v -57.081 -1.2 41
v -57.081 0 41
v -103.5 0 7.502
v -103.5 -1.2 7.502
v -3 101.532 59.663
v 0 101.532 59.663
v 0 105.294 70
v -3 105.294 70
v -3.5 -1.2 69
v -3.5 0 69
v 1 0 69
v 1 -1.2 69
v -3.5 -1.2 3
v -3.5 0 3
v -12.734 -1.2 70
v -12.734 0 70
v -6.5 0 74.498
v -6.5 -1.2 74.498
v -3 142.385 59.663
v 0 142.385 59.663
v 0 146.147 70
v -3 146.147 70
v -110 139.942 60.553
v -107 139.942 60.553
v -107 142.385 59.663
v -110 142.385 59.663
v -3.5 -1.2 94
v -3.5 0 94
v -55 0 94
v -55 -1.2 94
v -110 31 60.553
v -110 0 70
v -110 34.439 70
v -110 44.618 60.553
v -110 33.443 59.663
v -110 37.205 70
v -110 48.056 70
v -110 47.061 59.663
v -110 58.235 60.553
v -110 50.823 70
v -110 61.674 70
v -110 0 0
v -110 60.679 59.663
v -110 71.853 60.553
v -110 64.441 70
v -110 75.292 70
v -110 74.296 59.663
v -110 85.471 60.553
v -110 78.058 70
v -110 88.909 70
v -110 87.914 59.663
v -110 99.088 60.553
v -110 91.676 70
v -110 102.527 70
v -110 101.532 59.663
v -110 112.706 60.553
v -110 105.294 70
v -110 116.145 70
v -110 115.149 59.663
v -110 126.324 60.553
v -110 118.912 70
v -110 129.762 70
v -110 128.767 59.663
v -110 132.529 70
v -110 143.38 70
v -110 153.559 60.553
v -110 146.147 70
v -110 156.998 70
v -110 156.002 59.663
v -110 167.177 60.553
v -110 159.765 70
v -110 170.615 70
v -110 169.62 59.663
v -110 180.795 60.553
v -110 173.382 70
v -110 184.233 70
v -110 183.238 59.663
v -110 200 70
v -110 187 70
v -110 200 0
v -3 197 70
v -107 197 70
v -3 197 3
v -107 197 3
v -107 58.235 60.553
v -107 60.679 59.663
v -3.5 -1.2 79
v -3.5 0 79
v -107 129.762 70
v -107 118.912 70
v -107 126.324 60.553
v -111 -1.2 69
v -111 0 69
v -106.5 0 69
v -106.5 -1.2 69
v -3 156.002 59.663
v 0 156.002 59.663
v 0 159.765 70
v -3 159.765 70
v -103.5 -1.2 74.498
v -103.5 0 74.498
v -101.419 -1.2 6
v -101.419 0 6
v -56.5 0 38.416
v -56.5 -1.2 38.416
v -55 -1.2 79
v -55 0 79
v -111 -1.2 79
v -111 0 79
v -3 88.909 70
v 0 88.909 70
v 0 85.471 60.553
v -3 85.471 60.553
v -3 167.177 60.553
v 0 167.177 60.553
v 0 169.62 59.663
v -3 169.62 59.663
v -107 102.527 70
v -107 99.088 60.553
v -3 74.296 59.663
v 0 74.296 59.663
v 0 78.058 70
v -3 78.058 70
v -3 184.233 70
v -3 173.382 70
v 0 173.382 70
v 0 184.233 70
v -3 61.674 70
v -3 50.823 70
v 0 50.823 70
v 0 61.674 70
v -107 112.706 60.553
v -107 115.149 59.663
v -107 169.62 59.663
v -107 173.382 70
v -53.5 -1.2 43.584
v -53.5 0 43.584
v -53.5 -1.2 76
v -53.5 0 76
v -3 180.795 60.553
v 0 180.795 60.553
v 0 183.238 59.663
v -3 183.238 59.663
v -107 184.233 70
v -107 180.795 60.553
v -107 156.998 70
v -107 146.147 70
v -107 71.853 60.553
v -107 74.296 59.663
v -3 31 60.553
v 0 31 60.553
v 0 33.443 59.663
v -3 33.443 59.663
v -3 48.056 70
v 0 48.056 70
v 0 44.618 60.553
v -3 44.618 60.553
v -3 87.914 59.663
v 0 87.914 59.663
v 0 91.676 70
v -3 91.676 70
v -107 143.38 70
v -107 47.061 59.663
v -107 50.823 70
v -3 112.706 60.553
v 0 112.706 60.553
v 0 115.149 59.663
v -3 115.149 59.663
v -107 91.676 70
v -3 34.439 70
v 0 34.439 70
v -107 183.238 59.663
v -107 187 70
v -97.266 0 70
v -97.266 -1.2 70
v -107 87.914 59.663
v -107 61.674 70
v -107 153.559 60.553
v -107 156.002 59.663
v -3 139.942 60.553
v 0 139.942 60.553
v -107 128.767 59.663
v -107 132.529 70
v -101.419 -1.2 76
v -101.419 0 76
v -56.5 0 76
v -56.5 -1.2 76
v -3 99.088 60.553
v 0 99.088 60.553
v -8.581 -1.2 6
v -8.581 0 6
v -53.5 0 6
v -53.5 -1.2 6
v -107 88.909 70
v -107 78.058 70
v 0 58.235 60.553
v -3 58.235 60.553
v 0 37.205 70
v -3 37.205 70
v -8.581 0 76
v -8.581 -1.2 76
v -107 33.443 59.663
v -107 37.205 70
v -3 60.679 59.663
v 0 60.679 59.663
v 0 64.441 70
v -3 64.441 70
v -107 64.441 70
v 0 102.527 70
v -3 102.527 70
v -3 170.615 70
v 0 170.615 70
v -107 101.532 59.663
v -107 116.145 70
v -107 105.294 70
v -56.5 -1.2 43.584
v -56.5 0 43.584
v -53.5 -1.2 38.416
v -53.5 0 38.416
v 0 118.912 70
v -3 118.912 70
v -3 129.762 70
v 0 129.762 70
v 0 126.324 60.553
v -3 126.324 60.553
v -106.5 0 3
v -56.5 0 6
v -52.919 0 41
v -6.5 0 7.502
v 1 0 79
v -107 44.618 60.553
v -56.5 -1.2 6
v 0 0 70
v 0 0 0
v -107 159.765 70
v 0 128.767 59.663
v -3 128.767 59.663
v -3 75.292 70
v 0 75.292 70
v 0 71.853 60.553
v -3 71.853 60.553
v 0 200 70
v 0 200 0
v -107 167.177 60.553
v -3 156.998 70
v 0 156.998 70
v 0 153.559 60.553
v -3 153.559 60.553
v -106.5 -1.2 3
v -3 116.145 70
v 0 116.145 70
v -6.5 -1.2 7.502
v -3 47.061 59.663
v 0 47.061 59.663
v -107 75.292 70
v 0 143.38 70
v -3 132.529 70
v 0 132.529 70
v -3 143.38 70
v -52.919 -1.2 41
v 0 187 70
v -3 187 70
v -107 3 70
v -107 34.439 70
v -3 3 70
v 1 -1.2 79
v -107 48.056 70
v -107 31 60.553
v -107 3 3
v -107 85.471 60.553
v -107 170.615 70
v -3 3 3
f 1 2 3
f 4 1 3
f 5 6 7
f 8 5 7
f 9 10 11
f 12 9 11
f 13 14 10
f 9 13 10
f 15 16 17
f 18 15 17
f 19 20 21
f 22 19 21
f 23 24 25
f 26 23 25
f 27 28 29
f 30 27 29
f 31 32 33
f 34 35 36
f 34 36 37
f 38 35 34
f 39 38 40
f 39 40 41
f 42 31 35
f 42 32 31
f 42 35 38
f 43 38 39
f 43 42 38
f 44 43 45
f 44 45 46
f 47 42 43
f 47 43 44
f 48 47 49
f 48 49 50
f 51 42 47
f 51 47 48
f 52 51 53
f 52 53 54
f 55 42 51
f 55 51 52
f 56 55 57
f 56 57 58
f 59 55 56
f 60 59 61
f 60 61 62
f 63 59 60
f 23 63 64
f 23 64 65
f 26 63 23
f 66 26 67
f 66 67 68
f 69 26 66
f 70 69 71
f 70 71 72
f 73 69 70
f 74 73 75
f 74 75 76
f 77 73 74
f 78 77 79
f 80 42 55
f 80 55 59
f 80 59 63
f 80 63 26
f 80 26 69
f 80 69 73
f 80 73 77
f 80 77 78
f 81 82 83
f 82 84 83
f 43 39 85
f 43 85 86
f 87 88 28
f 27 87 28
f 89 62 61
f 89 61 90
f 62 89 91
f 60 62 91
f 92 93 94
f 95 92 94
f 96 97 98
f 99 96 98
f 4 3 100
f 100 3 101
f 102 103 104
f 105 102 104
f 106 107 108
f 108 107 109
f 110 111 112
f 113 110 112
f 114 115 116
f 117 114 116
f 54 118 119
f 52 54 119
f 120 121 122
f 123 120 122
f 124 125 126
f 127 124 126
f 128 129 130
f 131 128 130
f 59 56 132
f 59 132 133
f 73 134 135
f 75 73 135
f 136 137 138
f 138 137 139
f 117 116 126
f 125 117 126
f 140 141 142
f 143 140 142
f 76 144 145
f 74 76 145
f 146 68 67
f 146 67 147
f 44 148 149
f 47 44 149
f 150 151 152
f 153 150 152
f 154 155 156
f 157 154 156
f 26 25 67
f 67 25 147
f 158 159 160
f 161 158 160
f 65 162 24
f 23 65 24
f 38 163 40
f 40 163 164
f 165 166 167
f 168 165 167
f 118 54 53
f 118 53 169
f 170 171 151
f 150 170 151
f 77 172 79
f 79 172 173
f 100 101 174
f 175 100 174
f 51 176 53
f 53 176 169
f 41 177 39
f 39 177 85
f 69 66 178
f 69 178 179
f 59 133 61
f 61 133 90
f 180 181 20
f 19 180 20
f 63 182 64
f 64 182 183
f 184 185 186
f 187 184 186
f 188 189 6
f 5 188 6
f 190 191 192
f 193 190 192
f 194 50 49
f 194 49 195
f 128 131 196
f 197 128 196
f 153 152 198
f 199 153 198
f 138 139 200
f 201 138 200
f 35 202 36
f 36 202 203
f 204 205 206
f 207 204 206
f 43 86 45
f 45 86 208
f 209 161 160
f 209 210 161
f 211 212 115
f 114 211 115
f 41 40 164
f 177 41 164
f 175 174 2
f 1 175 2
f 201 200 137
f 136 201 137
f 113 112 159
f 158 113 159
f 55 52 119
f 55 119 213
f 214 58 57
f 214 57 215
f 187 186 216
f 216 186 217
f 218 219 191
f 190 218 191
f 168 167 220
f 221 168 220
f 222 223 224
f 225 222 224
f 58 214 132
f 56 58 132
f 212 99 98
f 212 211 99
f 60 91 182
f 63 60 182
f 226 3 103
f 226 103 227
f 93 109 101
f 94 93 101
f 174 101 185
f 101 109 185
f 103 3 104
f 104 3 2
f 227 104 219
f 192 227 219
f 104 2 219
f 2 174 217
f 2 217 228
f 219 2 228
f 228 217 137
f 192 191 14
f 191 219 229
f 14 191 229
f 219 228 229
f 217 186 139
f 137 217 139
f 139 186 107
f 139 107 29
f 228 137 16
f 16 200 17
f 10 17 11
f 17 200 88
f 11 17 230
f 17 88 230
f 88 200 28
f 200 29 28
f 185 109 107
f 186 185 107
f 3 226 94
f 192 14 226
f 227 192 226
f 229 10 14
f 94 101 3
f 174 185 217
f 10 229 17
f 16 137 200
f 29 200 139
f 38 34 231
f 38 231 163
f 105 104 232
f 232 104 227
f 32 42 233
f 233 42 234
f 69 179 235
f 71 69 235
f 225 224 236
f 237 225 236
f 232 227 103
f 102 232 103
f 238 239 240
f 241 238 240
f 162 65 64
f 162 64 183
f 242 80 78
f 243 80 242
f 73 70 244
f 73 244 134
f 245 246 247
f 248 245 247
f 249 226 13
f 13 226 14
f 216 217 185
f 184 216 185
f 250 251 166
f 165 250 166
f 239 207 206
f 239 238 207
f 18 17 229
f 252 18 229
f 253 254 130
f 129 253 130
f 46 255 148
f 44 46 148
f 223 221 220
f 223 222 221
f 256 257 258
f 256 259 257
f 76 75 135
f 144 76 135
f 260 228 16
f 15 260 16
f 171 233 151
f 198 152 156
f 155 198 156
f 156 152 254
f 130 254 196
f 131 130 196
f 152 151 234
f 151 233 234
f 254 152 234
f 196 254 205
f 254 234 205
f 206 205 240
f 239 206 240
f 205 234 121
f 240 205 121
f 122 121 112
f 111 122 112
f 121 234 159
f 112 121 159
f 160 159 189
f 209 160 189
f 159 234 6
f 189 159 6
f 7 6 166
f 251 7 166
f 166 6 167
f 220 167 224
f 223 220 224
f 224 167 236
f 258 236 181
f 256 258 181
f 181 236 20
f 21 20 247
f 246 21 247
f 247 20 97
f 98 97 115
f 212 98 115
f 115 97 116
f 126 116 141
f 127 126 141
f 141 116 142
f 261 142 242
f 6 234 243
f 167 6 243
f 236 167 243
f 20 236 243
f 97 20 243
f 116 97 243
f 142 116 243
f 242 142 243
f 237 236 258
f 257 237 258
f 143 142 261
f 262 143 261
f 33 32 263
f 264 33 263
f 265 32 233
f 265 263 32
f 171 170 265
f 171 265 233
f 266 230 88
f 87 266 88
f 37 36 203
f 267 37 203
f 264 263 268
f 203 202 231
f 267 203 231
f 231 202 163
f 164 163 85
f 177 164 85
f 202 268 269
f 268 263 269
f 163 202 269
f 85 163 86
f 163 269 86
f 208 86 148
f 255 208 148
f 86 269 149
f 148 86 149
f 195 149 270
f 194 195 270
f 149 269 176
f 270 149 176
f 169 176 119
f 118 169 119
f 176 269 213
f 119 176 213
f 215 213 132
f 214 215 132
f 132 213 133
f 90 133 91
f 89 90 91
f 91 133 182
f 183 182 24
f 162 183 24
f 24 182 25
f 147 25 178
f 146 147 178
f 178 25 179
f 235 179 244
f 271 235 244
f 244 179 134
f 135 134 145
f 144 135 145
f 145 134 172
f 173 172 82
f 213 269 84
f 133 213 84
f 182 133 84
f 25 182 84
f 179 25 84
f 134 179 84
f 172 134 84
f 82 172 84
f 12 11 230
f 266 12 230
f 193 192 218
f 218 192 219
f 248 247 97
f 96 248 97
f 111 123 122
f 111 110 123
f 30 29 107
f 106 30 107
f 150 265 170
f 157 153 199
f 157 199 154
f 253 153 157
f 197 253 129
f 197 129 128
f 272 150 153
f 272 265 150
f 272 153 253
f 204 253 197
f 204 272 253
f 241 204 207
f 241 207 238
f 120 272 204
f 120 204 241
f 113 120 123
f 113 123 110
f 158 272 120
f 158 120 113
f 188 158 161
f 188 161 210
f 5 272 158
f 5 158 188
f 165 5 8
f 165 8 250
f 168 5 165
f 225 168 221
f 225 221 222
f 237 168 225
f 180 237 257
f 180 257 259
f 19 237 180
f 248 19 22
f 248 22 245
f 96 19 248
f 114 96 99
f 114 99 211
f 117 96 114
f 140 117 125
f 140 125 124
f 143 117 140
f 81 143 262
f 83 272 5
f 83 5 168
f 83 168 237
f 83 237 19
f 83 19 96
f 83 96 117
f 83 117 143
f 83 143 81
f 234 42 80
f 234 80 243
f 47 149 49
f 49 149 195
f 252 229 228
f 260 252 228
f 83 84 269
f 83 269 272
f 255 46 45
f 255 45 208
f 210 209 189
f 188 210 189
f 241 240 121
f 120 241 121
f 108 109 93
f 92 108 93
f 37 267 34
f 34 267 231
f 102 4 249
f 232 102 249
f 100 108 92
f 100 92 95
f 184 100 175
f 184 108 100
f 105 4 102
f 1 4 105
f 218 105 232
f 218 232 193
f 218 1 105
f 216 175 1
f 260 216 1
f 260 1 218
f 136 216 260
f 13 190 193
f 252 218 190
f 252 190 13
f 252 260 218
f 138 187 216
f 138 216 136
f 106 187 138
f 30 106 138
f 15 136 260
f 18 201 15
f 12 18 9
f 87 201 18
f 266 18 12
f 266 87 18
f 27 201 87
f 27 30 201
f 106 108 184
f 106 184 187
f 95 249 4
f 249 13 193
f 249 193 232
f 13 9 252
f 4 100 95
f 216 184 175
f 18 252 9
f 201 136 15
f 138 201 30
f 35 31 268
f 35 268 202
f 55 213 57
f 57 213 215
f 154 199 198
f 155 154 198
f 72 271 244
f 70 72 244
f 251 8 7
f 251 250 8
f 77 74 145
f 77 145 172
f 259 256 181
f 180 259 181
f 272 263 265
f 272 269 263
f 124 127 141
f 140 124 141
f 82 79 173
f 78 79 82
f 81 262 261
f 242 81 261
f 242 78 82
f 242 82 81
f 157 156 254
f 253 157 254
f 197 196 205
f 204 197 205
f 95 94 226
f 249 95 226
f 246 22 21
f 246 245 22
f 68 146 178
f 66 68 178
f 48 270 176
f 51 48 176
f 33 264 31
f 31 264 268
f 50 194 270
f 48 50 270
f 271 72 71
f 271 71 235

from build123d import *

# Parameters (mm, degrees)
F0_W     = 110
F0_H     = 200
F1_DEPTH = 70
F2_T     = -3
F5_DEPTH = 110.001
F3_W     = 3
F3_H     = 6
F6_DEPTH = 1.2


with BuildPart() as f1:
    # F0 (on Top) → F1 (new body)
    with BuildSketch(Plane.XY):
        with Locations((-55, 100)):
            Rectangle(F0_W, F0_H)
    extrude(amount=F1_DEPTH)

    # F2
    f2_openings = [f1.faces().sort_by_distance(p)[0] for p in [
        (-55, 100, 70),
    ]]
    offset(amount=F2_T, openings=f2_openings)

    # F4 (on face) → F5 (cut, through all)
    with BuildSketch(Plane.YZ):
        Polygon((183.2377784234, 59.6633811714), (187, 70), (184.2331377916, 70), (180.7945776094, 60.552633544), align=None)
        Polygon((170.615448918, 70), (167.1768887358, 60.552633544), (169.6200895498, 59.6633811714), (173.3823111264, 70), align=None)
        Polygon((156.9977600444, 70), (153.5591998622, 60.552633544), (156.0024006762, 59.6633811714), (159.7646222528, 70), align=None)
        Polygon((143.3800711708, 70), (139.9415109886, 60.552633544), (142.3847118027, 59.6633811714), (146.1469333793, 70), align=None)
        Polygon((129.7623822972, 70), (126.323822115, 60.552633544), (128.7670229291, 59.6633811714), (132.5292445057, 70), align=None)
        Polygon((116.1446934237, 70), (112.7061332415, 60.552633544), (115.1493340555, 59.6633811714), (118.9115556321, 70), align=None)
        Polygon((102.5270045501, 70), (99.0884443679, 60.552633544), (101.5316451819, 59.6633811714), (105.2938667585, 70), align=None)
        Polygon((88.9093156765, 70), (85.4707554943, 60.552633544), (87.9139563084, 59.6633811714), (91.676177885, 70), align=None)
        Polygon((75.2916268029, 70), (71.8530666207, 60.552633544), (74.2962674348, 59.6633811714), (78.0584890114, 70), align=None)
        Polygon((61.6739379294, 70), (58.2353777472, 60.552633544), (60.6785785612, 59.6633811714), (64.4408001378, 70), align=None)
        Polygon((48.0562490558, 70), (44.6176888736, 60.552633544), (47.0608896876, 59.6633811714), (50.8231112642, 70), align=None)
        Polygon((34.4385601822, 70), (31, 60.552633544), (33.443200814, 59.6633811714), (37.2054223906, 70), align=None)
    extrude(amount=-F5_DEPTH, mode=Mode.SUBTRACT)


with BuildPart() as f6:
    # F3 (on face) → F6 (new body)
    with BuildSketch(Plane.XZ):
        Polygon((-55, 79), (-106.5, 79), (-111, 79), (-111, 69), (-110, 69), (-110, 70), (-103.5, 70), (-103.5, 74.4984656638), (-103.5, 76), (-101.4193024199, 76), (-56.5, 76), (-53.5, 76), (-8.5806975801, 76), (-6.5, 76), (-6.5, 74.4984656638), (-6.5, 70), (0, 70), (0, 69), (1, 69), (1, 79), (-3.5, 79), (-3.5, 94), (-55, 94), align=None)
        Polygon((-110, 70), (-110, 69), (-106.5, 69), (-106.5, 3), (-3.5, 3), (-3.5, 69), (0, 69), (0, 70), (-6.5, 70), (-6.5, 7.5015343362), (-6.5, 6), (-8.5806975801, 6), (-53.5, 6), (-56.5, 6), (-101.4193024199, 6), (-103.5, 6), (-103.5, 7.5015343362), (-103.5, 70), align=None)
        Polygon((-57.0806975801, 41), (-103.5, 7.5015343362), (-103.5, 6), (-101.4193024199, 6), (-56.5, 38.415991437), (-56.5, 40.5809398906), align=None)
        Polygon((-56.5, 43.584008563), (-56.5, 41.4190601094), (-55, 42.5015343362), align=None)
        Polygon((-52.9193024199, 41), (-12.7335881342, 70), (-16.8949832944, 70), (-53.5, 43.584008563), (-53.5, 41.4190601094), align=None)
        Polygon((-52.9193024199, 41), (-53.5, 41.4190601094), (-53.5, 40.5809398906), align=None)
        Polygon((-6.5, 6), (-6.5, 7.5015343362), (-52.9193024199, 41), (-53.5, 40.5809398906), (-53.5, 38.415991437), (-8.5806975801, 6), align=None)
        Polygon((-12.7335881342, 70), (-6.5, 74.4984656638), (-6.5, 76), (-8.5806975801, 76), (-16.8949832944, 70), align=None)
        Polygon((-103.5, 76), (-103.5, 74.4984656638), (-97.2664118658, 70), (-93.1050167056, 70), (-101.4193024199, 76), align=None)
        Polygon((-93.1050167056, 70), (-97.2664118658, 70), (-57.0806975801, 41), (-56.5, 41.4190601094), (-56.5, 43.584008563), align=None)
        Polygon((-56.5, 70), (-56.5, 43.584008563), (-55, 42.5015343362), (-53.5, 43.584008563), (-53.5, 70), align=None)
        with Locations((-55, 73)):
            Rectangle(F3_W, F3_H)
        Polygon((-56.5, 38.415991437), (-56.5, 6), (-53.5, 6), (-53.5, 38.415991437), (-55, 39.4984656638), align=None)
        Polygon((-55, 42.5015343362), (-56.5, 41.4190601094), (-56.5, 40.5809398906), (-55, 39.4984656638), (-53.5, 40.5809398906), (-53.5, 41.4190601094), align=None)
        Polygon((-53.5, 40.5809398906), (-55, 39.4984656638), (-53.5, 38.415991437), align=None)
        Polygon((-53.5, 43.584008563), (-55, 42.5015343362), (-53.5, 41.4190601094), align=None)
        Polygon((-55, 39.4984656638), (-56.5, 40.5809398906), (-56.5, 38.415991437), align=None)
        Polygon((-56.5, 41.4190601094), (-57.0806975801, 41), (-56.5, 40.5809398906), align=None)
    extrude(amount=F6_DEPTH)


solid = Compound([f1.part, f6.part])
